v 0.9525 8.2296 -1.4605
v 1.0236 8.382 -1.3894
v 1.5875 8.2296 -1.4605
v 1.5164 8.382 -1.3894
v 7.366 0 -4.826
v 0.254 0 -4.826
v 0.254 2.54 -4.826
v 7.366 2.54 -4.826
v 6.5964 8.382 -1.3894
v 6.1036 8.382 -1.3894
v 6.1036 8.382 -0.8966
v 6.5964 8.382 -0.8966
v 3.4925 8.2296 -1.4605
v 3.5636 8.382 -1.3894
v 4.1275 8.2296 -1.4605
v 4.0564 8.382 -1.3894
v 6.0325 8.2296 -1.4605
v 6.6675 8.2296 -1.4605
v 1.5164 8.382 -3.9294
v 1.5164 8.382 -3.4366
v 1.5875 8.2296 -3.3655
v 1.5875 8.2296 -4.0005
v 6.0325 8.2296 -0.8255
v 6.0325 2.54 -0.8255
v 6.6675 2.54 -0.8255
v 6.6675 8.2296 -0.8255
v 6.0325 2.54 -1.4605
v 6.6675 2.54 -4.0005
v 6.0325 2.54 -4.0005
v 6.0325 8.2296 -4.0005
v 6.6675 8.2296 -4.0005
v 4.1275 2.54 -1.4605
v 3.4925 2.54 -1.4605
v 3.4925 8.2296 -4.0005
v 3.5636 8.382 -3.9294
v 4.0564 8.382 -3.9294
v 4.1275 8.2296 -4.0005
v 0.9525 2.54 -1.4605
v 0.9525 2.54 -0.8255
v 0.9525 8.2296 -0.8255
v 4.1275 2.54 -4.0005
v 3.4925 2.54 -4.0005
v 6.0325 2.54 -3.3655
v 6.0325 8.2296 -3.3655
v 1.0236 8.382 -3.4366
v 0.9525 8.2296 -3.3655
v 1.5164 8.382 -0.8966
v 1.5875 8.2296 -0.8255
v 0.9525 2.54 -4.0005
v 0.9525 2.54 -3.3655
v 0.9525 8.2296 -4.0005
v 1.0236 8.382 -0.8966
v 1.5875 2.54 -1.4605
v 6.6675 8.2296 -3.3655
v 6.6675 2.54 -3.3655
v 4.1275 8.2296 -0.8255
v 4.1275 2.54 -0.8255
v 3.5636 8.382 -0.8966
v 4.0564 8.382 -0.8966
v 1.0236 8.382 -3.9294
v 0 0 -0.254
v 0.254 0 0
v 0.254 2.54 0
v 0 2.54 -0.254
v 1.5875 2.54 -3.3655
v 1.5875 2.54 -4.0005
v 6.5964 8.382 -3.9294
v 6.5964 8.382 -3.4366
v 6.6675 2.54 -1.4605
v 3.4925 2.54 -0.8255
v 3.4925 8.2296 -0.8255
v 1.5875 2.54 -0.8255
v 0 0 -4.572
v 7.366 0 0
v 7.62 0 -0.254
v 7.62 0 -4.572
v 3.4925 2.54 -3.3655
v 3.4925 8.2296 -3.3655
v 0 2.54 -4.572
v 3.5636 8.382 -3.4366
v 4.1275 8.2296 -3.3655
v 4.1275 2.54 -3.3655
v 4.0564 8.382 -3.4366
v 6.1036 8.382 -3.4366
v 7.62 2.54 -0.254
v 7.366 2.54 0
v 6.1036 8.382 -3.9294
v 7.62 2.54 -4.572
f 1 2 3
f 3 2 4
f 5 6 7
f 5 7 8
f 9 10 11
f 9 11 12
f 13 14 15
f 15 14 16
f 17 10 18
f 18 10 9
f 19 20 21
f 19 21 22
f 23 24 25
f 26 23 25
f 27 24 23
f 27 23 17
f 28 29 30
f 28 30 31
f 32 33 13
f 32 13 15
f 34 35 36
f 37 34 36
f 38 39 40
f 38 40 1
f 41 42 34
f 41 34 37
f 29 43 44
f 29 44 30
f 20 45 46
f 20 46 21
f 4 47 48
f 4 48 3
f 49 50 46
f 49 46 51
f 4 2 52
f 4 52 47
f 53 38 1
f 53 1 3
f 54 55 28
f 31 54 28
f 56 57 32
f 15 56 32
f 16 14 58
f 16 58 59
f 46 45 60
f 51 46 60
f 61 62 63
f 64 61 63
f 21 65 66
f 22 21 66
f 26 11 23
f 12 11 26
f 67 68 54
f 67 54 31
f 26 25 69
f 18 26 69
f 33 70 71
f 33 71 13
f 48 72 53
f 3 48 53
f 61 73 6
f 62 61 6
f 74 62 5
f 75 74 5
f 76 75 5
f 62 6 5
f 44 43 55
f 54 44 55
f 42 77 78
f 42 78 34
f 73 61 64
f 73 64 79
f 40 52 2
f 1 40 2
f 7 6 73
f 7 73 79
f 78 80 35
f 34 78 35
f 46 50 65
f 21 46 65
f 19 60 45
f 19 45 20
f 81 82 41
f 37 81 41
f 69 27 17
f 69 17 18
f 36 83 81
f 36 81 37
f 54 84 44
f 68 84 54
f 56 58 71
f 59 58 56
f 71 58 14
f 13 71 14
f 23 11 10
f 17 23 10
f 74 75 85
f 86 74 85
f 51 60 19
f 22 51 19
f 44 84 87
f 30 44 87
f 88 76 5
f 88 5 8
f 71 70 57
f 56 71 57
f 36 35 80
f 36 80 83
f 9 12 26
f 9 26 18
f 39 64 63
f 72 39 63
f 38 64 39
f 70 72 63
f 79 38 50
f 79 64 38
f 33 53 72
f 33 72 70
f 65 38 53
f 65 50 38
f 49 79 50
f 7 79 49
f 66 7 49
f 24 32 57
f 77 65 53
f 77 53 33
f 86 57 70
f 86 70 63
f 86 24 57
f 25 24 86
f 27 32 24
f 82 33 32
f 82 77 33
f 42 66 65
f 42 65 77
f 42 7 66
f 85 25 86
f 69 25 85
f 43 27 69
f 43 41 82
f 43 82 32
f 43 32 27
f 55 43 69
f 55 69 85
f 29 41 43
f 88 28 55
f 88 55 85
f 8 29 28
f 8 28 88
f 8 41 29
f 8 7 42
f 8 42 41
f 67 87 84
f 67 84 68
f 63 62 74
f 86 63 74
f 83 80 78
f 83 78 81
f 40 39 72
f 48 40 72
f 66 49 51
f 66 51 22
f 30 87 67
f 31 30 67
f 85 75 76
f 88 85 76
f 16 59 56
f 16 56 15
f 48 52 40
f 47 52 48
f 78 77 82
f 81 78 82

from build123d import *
from OCP.BRepFilletAPI import BRepFilletAPI_MakeChamfer

# Parameters (mm, degrees)
SKETCH1_W                   = 7.62
SKETCH1_H                   = 4.826
BOSS_EXTRUDE1_DEPTH         = 2.54
SKETCH2_W                   = 0.635
SKETCH2_H                   = 0.635
BOSS_EXTRUDE2_DEPTH         = 5.842
CHAMFER2_SIZE               = 0.1524
CHAMFER2_SIZE2              = 0.071065287
CHAMFER1_SIZE               = 0.254
LPATTERN2_COUNT             = 3
LPATTERN2_PITCH             = 2.54
LPATTERN2_COUNT_DIR2        = 2
LPATTERN2_PITCH_DIR2        = 2.54
CHAMFER2_OF_LPATTERN2_SIZE  = 0.1524
CHAMFER2_OF_LPATTERN2_SIZE2 = 0.071065287


with BuildPart() as part:
    # Sketch1 → Boss-Extrude1 (new body)
    with BuildSketch(Plane(origin=(0, 0, 0), x_dir=(1, 0, 0), z_dir=(0, 1, 0))):
        with Locations((3.81, 2.413)):
            Rectangle(SKETCH1_W, SKETCH1_H)
    extrude(amount=BOSS_EXTRUDE1_DEPTH)

    # Sketch2 → Boss-Extrude2 (add)
    with BuildSketch(Plane(origin=(0, 2.54, 0), x_dir=(1, 0, 0), z_dir=(0, 1, 0))):
        with Locations((1.27, 1.143)):
            Rectangle(SKETCH2_W, SKETCH2_H)
    boss_extrude2 = extrude(amount=BOSS_EXTRUDE2_DEPTH)

    # Chamfer2: one chamfer whose edges measure the first distance from different faces: ONE call of the kernel's chamfer builder (chamfer() names one face for all edges)
    chamfer2_edges_1 = [part.edges().sort_by_distance(p)[0] for p in [
        (1.5875, 8.382, -1.143),
    ]]
    chamfer2_side_1 = [part.faces().sort_by_distance(p)[0] for p in [
        (1.5875, 5.461, -1.143),
    ]]
    chamfer2_edges_2 = [part.edges().sort_by_distance(p)[0] for p in [
        (1.27, 8.382, -1.4605),
    ]]
    chamfer2_side_2 = [part.faces().sort_by_distance(p)[0] for p in [
        (1.27, 5.461, -1.4605),
    ]]
    chamfer2_edges_3 = [part.edges().sort_by_distance(p)[0] for p in [
        (0.9525, 8.382, -1.143),
    ]]
    chamfer2_side_3 = [part.faces().sort_by_distance(p)[0] for p in [
        (0.9525, 5.461, -1.143),
    ]]
    chamfer2_edges_4 = [part.edges().sort_by_distance(p)[0] for p in [
        (1.27, 8.382, -0.8255),
    ]]
    chamfer2_side_4 = [part.faces().sort_by_distance(p)[0] for p in [
        (1.27, 5.461, -0.8255),
    ]]
    chamfer2 = BRepFilletAPI_MakeChamfer(part.part.solid().wrapped)
    for e in chamfer2_edges_1:
        chamfer2.Add(CHAMFER2_SIZE, CHAMFER2_SIZE2, e.wrapped, chamfer2_side_1[0].wrapped)  # the first distance lies on this face
    for e in chamfer2_edges_2:
        chamfer2.Add(CHAMFER2_SIZE, CHAMFER2_SIZE2, e.wrapped, chamfer2_side_2[0].wrapped)  # the first distance lies on this face
    for e in chamfer2_edges_3:
        chamfer2.Add(CHAMFER2_SIZE, CHAMFER2_SIZE2, e.wrapped, chamfer2_side_3[0].wrapped)  # the first distance lies on this face
    for e in chamfer2_edges_4:
        chamfer2.Add(CHAMFER2_SIZE, CHAMFER2_SIZE2, e.wrapped, chamfer2_side_4[0].wrapped)  # the first distance lies on this face
    add(Compound.cast(chamfer2.Shape()), mode=Mode.REPLACE)

    # Chamfer1
    chamfer1_edges = [part.edges().sort_by_distance(p)[0] for p in [
        (0, 1.27, -4.826),
        (7.62, 1.27, -4.826),
        (7.62, 1.27, 0),
        (0, 1.27, 0),
    ]]
    chamfer(chamfer1_edges, length=CHAMFER1_SIZE)

    # LPattern2: Boss-Extrude2 3 × 2
    with Locations(*[(i * LPATTERN2_PITCH, 0, -j * LPATTERN2_PITCH_DIR2) for i in range(LPATTERN2_COUNT) for j in range(LPATTERN2_COUNT_DIR2) if (i, j) != (0, 0)]):
        add(boss_extrude2)

    # Chamfer2 of LPattern2: one chamfer whose edges measure the first distance from different faces: ONE call of the kernel's chamfer builder (chamfer() names one face for all edges)
    chamfer2_of_lpattern2_edges_1 = [part.edges().sort_by_distance(p)[0] for p in [
        (1.5875, 8.382, -3.683),
    ]]
    chamfer2_of_lpattern2_side_1 = [part.faces().sort_by_distance(p)[0] for p in [
        (1.5875, 5.461, -3.683),
    ]]
    chamfer2_of_lpattern2_edges_2 = [part.edges().sort_by_distance(p)[0] for p in [
        (1.27, 8.382, -4.0005),
    ]]
    chamfer2_of_lpattern2_side_2 = [part.faces().sort_by_distance(p)[0] for p in [
        (1.27, 5.461, -4.0005),
    ]]
    chamfer2_of_lpattern2_edges_3 = [part.edges().sort_by_distance(p)[0] for p in [
        (0.9525, 8.382, -3.683),
    ]]
    chamfer2_of_lpattern2_side_3 = [part.faces().sort_by_distance(p)[0] for p in [
        (0.9525, 5.461, -3.683),
    ]]
    chamfer2_of_lpattern2_edges_4 = [part.edges().sort_by_distance(p)[0] for p in [
        (1.27, 8.382, -3.3655),
    ]]
    chamfer2_of_lpattern2_side_4 = [part.faces().sort_by_distance(p)[0] for p in [
        (1.27, 5.461, -3.3655),
    ]]
    chamfer2_of_lpattern2_edges_5 = [part.edges().sort_by_distance(p)[0] for p in [
        (4.1275, 8.382, -1.143),
    ]]
    chamfer2_of_lpattern2_side_5 = [part.faces().sort_by_distance(p)[0] for p in [
        (4.1275, 5.461, -1.143),
    ]]
    chamfer2_of_lpattern2_edges_6 = [part.edges().sort_by_distance(p)[0] for p in [
        (3.81, 8.382, -1.4605),
    ]]
    chamfer2_of_lpattern2_side_6 = [part.faces().sort_by_distance(p)[0] for p in [
        (3.81, 5.461, -1.4605),
    ]]
    chamfer2_of_lpattern2_edges_7 = [part.edges().sort_by_distance(p)[0] for p in [
        (3.4925, 8.382, -1.143),
    ]]
    chamfer2_of_lpattern2_side_7 = [part.faces().sort_by_distance(p)[0] for p in [
        (3.4925, 5.461, -1.143),
    ]]
    chamfer2_of_lpattern2_edges_8 = [part.edges().sort_by_distance(p)[0] for p in [
        (3.81, 8.382, -0.8255),
    ]]
    chamfer2_of_lpattern2_side_8 = [part.faces().sort_by_distance(p)[0] for p in [
        (3.81, 5.461, -0.8255),
    ]]
    chamfer2_of_lpattern2_edges_9 = [part.edges().sort_by_distance(p)[0] for p in [
        (4.1275, 8.382, -3.683),
    ]]
    chamfer2_of_lpattern2_side_9 = [part.faces().sort_by_distance(p)[0] for p in [
        (4.1275, 5.461, -3.683),
    ]]
    chamfer2_of_lpattern2_edges_10 = [part.edges().sort_by_distance(p)[0] for p in [
        (3.81, 8.382, -4.0005),
    ]]
    chamfer2_of_lpattern2_side_10 = [part.faces().sort_by_distance(p)[0] for p in [
        (3.81, 5.461, -4.0005),
    ]]
    chamfer2_of_lpattern2_edges_11 = [part.edges().sort_by_distance(p)[0] for p in [
        (3.4925, 8.382, -3.683),
    ]]
    chamfer2_of_lpattern2_side_11 = [part.faces().sort_by_distance(p)[0] for p in [
        (3.4925, 5.461, -3.683),
    ]]
    chamfer2_of_lpattern2_edges_12 = [part.edges().sort_by_distance(p)[0] for p in [
        (3.81, 8.382, -3.3655),
    ]]
    chamfer2_of_lpattern2_side_12 = [part.faces().sort_by_distance(p)[0] for p in [
        (3.81, 5.461, -3.3655),
    ]]
    chamfer2_of_lpattern2_edges_13 = [part.edges().sort_by_distance(p)[0] for p in [
        (6.6675, 8.382, -1.143),
    ]]
    chamfer2_of_lpattern2_side_13 = [part.faces().sort_by_distance(p)[0] for p in [
        (6.6675, 5.461, -1.143),
    ]]
    chamfer2_of_lpattern2_edges_14 = [part.edges().sort_by_distance(p)[0] for p in [
        (6.35, 8.382, -1.4605),
    ]]
    chamfer2_of_lpattern2_side_14 = [part.faces().sort_by_distance(p)[0] for p in [
        (6.35, 5.461, -1.4605),
    ]]
    chamfer2_of_lpattern2_edges_15 = [part.edges().sort_by_distance(p)[0] for p in [
        (6.0325, 8.382, -1.143),
    ]]
    chamfer2_of_lpattern2_side_15 = [part.faces().sort_by_distance(p)[0] for p in [
        (6.0325, 5.461, -1.143),
    ]]
    chamfer2_of_lpattern2_edges_16 = [part.edges().sort_by_distance(p)[0] for p in [
        (6.35, 8.382, -0.8255),
    ]]
    chamfer2_of_lpattern2_side_16 = [part.faces().sort_by_distance(p)[0] for p in [
        (6.35, 5.461, -0.8255),
    ]]
    chamfer2_of_lpattern2_edges_17 = [part.edges().sort_by_distance(p)[0] for p in [
        (6.6675, 8.382, -3.683),
    ]]
    chamfer2_of_lpattern2_side_17 = [part.faces().sort_by_distance(p)[0] for p in [
        (6.6675, 5.461, -3.683),
    ]]
    chamfer2_of_lpattern2_edges_18 = [part.edges().sort_by_distance(p)[0] for p in [
        (6.35, 8.382, -4.0005),
    ]]
    chamfer2_of_lpattern2_side_18 = [part.faces().sort_by_distance(p)[0] for p in [
        (6.35, 5.461, -4.0005),
    ]]
    chamfer2_of_lpattern2_edges_19 = [part.edges().sort_by_distance(p)[0] for p in [
        (6.0325, 8.382, -3.683),
    ]]
    chamfer2_of_lpattern2_side_19 = [part.faces().sort_by_distance(p)[0] for p in [
        (6.0325, 5.461, -3.683),
    ]]
    chamfer2_of_lpattern2_edges_20 = [part.edges().sort_by_distance(p)[0] for p in [
        (6.35, 8.382, -3.3655),
    ]]
    chamfer2_of_lpattern2_side_20 = [part.faces().sort_by_distance(p)[0] for p in [
        (6.35, 5.461, -3.3655),
    ]]
    chamfer2_of_lpattern2 = BRepFilletAPI_MakeChamfer(part.part.solid().wrapped)
    for e in chamfer2_of_lpattern2_edges_1:
        chamfer2_of_lpattern2.Add(CHAMFER2_OF_LPATTERN2_SIZE, CHAMFER2_OF_LPATTERN2_SIZE2, e.wrapped, chamfer2_of_lpattern2_side_1[0].wrapped)  # the first distance lies on this face
    for e in chamfer2_of_lpattern2_edges_2:
        chamfer2_of_lpattern2.Add(CHAMFER2_OF_LPATTERN2_SIZE, CHAMFER2_OF_LPATTERN2_SIZE2, e.wrapped, chamfer2_of_lpattern2_side_2[0].wrapped)  # the first distance lies on this face
    for e in chamfer2_of_lpattern2_edges_3:
        chamfer2_of_lpattern2.Add(CHAMFER2_OF_LPATTERN2_SIZE, CHAMFER2_OF_LPATTERN2_SIZE2, e.wrapped, chamfer2_of_lpattern2_side_3[0].wrapped)  # the first distance lies on this face
    for e in chamfer2_of_lpattern2_edges_4:
        chamfer2_of_lpattern2.Add(CHAMFER2_OF_LPATTERN2_SIZE, CHAMFER2_OF_LPATTERN2_SIZE2, e.wrapped, chamfer2_of_lpattern2_side_4[0].wrapped)  # the first distance lies on this face
    for e in chamfer2_of_lpattern2_edges_5:
        chamfer2_of_lpattern2.Add(CHAMFER2_OF_LPATTERN2_SIZE, CHAMFER2_OF_LPATTERN2_SIZE2, e.wrapped, chamfer2_of_lpattern2_side_5[0].wrapped)  # the first distance lies on this face
    for e in chamfer2_of_lpattern2_edges_6:
        chamfer2_of_lpattern2.Add(CHAMFER2_OF_LPATTERN2_SIZE, CHAMFER2_OF_LPATTERN2_SIZE2, e.wrapped, chamfer2_of_lpattern2_side_6[0].wrapped)  # the first distance lies on this face
    for e in chamfer2_of_lpattern2_edges_7:
        chamfer2_of_lpattern2.Add(CHAMFER2_OF_LPATTERN2_SIZE, CHAMFER2_OF_LPATTERN2_SIZE2, e.wrapped, chamfer2_of_lpattern2_side_7[0].wrapped)  # the first distance lies on this face
    for e in chamfer2_of_lpattern2_edges_8:
        chamfer2_of_lpattern2.Add(CHAMFER2_OF_LPATTERN2_SIZE, CHAMFER2_OF_LPATTERN2_SIZE2, e.wrapped, chamfer2_of_lpattern2_side_8[0].wrapped)  # the first distance lies on this face
    for e in chamfer2_of_lpattern2_edges_9:
        chamfer2_of_lpattern2.Add(CHAMFER2_OF_LPATTERN2_SIZE, CHAMFER2_OF_LPATTERN2_SIZE2, e.wrapped, chamfer2_of_lpattern2_side_9[0].wrapped)  # the first distance lies on this face
    for e in chamfer2_of_lpattern2_edges_10:
        chamfer2_of_lpattern2.Add(CHAMFER2_OF_LPATTERN2_SIZE, CHAMFER2_OF_LPATTERN2_SIZE2, e.wrapped, chamfer2_of_lpattern2_side_10[0].wrapped)  # the first distance lies on this face
    for e in chamfer2_of_lpattern2_edges_11:
        chamfer2_of_lpattern2.Add(CHAMFER2_OF_LPATTERN2_SIZE, CHAMFER2_OF_LPATTERN2_SIZE2, e.wrapped, chamfer2_of_lpattern2_side_11[0].wrapped)  # the first distance lies on this face
    for e in chamfer2_of_lpattern2_edges_12:
        chamfer2_of_lpattern2.Add(CHAMFER2_OF_LPATTERN2_SIZE, CHAMFER2_OF_LPATTERN2_SIZE2, e.wrapped, chamfer2_of_lpattern2_side_12[0].wrapped)  # the first distance lies on this face
    for e in chamfer2_of_lpattern2_edges_13:
        chamfer2_of_lpattern2.Add(CHAMFER2_OF_LPATTERN2_SIZE, CHAMFER2_OF_LPATTERN2_SIZE2, e.wrapped, chamfer2_of_lpattern2_side_13[0].wrapped)  # the first distance lies on this face
    for e in chamfer2_of_lpattern2_edges_14:
        chamfer2_of_lpattern2.Add(CHAMFER2_OF_LPATTERN2_SIZE, CHAMFER2_OF_LPATTERN2_SIZE2, e.wrapped, chamfer2_of_lpattern2_side_14[0].wrapped)  # the first distance lies on this face
    for e in chamfer2_of_lpattern2_edges_15:
        chamfer2_of_lpattern2.Add(CHAMFER2_OF_LPATTERN2_SIZE, CHAMFER2_OF_LPATTERN2_SIZE2, e.wrapped, chamfer2_of_lpattern2_side_15[0].wrapped)  # the first distance lies on this face
    for e in chamfer2_of_lpattern2_edges_16:
        chamfer2_of_lpattern2.Add(CHAMFER2_OF_LPATTERN2_SIZE, CHAMFER2_OF_LPATTERN2_SIZE2, e.wrapped, chamfer2_of_lpattern2_side_16[0].wrapped)  # the first distance lies on this face
    for e in chamfer2_of_lpattern2_edges_17:
        chamfer2_of_lpattern2.Add(CHAMFER2_OF_LPATTERN2_SIZE, CHAMFER2_OF_LPATTERN2_SIZE2, e.wrapped, chamfer2_of_lpattern2_side_17[0].wrapped)  # the first distance lies on this face
    for e in chamfer2_of_lpattern2_edges_18:
        chamfer2_of_lpattern2.Add(CHAMFER2_OF_LPATTERN2_SIZE, CHAMFER2_OF_LPATTERN2_SIZE2, e.wrapped, chamfer2_of_lpattern2_side_18[0].wrapped)  # the first distance lies on this face
    for e in chamfer2_of_lpattern2_edges_19:
        chamfer2_of_lpattern2.Add(CHAMFER2_OF_LPATTERN2_SIZE, CHAMFER2_OF_LPATTERN2_SIZE2, e.wrapped, chamfer2_of_lpattern2_side_19[0].wrapped)  # the first distance lies on this face
    for e in chamfer2_of_lpattern2_edges_20:
        chamfer2_of_lpattern2.Add(CHAMFER2_OF_LPATTERN2_SIZE, CHAMFER2_OF_LPATTERN2_SIZE2, e.wrapped, chamfer2_of_lpattern2_side_20[0].wrapped)  # the first distance lies on this face
    add(Compound.cast(chamfer2_of_lpattern2.Shape()), mode=Mode.REPLACE)


solid = part.part
